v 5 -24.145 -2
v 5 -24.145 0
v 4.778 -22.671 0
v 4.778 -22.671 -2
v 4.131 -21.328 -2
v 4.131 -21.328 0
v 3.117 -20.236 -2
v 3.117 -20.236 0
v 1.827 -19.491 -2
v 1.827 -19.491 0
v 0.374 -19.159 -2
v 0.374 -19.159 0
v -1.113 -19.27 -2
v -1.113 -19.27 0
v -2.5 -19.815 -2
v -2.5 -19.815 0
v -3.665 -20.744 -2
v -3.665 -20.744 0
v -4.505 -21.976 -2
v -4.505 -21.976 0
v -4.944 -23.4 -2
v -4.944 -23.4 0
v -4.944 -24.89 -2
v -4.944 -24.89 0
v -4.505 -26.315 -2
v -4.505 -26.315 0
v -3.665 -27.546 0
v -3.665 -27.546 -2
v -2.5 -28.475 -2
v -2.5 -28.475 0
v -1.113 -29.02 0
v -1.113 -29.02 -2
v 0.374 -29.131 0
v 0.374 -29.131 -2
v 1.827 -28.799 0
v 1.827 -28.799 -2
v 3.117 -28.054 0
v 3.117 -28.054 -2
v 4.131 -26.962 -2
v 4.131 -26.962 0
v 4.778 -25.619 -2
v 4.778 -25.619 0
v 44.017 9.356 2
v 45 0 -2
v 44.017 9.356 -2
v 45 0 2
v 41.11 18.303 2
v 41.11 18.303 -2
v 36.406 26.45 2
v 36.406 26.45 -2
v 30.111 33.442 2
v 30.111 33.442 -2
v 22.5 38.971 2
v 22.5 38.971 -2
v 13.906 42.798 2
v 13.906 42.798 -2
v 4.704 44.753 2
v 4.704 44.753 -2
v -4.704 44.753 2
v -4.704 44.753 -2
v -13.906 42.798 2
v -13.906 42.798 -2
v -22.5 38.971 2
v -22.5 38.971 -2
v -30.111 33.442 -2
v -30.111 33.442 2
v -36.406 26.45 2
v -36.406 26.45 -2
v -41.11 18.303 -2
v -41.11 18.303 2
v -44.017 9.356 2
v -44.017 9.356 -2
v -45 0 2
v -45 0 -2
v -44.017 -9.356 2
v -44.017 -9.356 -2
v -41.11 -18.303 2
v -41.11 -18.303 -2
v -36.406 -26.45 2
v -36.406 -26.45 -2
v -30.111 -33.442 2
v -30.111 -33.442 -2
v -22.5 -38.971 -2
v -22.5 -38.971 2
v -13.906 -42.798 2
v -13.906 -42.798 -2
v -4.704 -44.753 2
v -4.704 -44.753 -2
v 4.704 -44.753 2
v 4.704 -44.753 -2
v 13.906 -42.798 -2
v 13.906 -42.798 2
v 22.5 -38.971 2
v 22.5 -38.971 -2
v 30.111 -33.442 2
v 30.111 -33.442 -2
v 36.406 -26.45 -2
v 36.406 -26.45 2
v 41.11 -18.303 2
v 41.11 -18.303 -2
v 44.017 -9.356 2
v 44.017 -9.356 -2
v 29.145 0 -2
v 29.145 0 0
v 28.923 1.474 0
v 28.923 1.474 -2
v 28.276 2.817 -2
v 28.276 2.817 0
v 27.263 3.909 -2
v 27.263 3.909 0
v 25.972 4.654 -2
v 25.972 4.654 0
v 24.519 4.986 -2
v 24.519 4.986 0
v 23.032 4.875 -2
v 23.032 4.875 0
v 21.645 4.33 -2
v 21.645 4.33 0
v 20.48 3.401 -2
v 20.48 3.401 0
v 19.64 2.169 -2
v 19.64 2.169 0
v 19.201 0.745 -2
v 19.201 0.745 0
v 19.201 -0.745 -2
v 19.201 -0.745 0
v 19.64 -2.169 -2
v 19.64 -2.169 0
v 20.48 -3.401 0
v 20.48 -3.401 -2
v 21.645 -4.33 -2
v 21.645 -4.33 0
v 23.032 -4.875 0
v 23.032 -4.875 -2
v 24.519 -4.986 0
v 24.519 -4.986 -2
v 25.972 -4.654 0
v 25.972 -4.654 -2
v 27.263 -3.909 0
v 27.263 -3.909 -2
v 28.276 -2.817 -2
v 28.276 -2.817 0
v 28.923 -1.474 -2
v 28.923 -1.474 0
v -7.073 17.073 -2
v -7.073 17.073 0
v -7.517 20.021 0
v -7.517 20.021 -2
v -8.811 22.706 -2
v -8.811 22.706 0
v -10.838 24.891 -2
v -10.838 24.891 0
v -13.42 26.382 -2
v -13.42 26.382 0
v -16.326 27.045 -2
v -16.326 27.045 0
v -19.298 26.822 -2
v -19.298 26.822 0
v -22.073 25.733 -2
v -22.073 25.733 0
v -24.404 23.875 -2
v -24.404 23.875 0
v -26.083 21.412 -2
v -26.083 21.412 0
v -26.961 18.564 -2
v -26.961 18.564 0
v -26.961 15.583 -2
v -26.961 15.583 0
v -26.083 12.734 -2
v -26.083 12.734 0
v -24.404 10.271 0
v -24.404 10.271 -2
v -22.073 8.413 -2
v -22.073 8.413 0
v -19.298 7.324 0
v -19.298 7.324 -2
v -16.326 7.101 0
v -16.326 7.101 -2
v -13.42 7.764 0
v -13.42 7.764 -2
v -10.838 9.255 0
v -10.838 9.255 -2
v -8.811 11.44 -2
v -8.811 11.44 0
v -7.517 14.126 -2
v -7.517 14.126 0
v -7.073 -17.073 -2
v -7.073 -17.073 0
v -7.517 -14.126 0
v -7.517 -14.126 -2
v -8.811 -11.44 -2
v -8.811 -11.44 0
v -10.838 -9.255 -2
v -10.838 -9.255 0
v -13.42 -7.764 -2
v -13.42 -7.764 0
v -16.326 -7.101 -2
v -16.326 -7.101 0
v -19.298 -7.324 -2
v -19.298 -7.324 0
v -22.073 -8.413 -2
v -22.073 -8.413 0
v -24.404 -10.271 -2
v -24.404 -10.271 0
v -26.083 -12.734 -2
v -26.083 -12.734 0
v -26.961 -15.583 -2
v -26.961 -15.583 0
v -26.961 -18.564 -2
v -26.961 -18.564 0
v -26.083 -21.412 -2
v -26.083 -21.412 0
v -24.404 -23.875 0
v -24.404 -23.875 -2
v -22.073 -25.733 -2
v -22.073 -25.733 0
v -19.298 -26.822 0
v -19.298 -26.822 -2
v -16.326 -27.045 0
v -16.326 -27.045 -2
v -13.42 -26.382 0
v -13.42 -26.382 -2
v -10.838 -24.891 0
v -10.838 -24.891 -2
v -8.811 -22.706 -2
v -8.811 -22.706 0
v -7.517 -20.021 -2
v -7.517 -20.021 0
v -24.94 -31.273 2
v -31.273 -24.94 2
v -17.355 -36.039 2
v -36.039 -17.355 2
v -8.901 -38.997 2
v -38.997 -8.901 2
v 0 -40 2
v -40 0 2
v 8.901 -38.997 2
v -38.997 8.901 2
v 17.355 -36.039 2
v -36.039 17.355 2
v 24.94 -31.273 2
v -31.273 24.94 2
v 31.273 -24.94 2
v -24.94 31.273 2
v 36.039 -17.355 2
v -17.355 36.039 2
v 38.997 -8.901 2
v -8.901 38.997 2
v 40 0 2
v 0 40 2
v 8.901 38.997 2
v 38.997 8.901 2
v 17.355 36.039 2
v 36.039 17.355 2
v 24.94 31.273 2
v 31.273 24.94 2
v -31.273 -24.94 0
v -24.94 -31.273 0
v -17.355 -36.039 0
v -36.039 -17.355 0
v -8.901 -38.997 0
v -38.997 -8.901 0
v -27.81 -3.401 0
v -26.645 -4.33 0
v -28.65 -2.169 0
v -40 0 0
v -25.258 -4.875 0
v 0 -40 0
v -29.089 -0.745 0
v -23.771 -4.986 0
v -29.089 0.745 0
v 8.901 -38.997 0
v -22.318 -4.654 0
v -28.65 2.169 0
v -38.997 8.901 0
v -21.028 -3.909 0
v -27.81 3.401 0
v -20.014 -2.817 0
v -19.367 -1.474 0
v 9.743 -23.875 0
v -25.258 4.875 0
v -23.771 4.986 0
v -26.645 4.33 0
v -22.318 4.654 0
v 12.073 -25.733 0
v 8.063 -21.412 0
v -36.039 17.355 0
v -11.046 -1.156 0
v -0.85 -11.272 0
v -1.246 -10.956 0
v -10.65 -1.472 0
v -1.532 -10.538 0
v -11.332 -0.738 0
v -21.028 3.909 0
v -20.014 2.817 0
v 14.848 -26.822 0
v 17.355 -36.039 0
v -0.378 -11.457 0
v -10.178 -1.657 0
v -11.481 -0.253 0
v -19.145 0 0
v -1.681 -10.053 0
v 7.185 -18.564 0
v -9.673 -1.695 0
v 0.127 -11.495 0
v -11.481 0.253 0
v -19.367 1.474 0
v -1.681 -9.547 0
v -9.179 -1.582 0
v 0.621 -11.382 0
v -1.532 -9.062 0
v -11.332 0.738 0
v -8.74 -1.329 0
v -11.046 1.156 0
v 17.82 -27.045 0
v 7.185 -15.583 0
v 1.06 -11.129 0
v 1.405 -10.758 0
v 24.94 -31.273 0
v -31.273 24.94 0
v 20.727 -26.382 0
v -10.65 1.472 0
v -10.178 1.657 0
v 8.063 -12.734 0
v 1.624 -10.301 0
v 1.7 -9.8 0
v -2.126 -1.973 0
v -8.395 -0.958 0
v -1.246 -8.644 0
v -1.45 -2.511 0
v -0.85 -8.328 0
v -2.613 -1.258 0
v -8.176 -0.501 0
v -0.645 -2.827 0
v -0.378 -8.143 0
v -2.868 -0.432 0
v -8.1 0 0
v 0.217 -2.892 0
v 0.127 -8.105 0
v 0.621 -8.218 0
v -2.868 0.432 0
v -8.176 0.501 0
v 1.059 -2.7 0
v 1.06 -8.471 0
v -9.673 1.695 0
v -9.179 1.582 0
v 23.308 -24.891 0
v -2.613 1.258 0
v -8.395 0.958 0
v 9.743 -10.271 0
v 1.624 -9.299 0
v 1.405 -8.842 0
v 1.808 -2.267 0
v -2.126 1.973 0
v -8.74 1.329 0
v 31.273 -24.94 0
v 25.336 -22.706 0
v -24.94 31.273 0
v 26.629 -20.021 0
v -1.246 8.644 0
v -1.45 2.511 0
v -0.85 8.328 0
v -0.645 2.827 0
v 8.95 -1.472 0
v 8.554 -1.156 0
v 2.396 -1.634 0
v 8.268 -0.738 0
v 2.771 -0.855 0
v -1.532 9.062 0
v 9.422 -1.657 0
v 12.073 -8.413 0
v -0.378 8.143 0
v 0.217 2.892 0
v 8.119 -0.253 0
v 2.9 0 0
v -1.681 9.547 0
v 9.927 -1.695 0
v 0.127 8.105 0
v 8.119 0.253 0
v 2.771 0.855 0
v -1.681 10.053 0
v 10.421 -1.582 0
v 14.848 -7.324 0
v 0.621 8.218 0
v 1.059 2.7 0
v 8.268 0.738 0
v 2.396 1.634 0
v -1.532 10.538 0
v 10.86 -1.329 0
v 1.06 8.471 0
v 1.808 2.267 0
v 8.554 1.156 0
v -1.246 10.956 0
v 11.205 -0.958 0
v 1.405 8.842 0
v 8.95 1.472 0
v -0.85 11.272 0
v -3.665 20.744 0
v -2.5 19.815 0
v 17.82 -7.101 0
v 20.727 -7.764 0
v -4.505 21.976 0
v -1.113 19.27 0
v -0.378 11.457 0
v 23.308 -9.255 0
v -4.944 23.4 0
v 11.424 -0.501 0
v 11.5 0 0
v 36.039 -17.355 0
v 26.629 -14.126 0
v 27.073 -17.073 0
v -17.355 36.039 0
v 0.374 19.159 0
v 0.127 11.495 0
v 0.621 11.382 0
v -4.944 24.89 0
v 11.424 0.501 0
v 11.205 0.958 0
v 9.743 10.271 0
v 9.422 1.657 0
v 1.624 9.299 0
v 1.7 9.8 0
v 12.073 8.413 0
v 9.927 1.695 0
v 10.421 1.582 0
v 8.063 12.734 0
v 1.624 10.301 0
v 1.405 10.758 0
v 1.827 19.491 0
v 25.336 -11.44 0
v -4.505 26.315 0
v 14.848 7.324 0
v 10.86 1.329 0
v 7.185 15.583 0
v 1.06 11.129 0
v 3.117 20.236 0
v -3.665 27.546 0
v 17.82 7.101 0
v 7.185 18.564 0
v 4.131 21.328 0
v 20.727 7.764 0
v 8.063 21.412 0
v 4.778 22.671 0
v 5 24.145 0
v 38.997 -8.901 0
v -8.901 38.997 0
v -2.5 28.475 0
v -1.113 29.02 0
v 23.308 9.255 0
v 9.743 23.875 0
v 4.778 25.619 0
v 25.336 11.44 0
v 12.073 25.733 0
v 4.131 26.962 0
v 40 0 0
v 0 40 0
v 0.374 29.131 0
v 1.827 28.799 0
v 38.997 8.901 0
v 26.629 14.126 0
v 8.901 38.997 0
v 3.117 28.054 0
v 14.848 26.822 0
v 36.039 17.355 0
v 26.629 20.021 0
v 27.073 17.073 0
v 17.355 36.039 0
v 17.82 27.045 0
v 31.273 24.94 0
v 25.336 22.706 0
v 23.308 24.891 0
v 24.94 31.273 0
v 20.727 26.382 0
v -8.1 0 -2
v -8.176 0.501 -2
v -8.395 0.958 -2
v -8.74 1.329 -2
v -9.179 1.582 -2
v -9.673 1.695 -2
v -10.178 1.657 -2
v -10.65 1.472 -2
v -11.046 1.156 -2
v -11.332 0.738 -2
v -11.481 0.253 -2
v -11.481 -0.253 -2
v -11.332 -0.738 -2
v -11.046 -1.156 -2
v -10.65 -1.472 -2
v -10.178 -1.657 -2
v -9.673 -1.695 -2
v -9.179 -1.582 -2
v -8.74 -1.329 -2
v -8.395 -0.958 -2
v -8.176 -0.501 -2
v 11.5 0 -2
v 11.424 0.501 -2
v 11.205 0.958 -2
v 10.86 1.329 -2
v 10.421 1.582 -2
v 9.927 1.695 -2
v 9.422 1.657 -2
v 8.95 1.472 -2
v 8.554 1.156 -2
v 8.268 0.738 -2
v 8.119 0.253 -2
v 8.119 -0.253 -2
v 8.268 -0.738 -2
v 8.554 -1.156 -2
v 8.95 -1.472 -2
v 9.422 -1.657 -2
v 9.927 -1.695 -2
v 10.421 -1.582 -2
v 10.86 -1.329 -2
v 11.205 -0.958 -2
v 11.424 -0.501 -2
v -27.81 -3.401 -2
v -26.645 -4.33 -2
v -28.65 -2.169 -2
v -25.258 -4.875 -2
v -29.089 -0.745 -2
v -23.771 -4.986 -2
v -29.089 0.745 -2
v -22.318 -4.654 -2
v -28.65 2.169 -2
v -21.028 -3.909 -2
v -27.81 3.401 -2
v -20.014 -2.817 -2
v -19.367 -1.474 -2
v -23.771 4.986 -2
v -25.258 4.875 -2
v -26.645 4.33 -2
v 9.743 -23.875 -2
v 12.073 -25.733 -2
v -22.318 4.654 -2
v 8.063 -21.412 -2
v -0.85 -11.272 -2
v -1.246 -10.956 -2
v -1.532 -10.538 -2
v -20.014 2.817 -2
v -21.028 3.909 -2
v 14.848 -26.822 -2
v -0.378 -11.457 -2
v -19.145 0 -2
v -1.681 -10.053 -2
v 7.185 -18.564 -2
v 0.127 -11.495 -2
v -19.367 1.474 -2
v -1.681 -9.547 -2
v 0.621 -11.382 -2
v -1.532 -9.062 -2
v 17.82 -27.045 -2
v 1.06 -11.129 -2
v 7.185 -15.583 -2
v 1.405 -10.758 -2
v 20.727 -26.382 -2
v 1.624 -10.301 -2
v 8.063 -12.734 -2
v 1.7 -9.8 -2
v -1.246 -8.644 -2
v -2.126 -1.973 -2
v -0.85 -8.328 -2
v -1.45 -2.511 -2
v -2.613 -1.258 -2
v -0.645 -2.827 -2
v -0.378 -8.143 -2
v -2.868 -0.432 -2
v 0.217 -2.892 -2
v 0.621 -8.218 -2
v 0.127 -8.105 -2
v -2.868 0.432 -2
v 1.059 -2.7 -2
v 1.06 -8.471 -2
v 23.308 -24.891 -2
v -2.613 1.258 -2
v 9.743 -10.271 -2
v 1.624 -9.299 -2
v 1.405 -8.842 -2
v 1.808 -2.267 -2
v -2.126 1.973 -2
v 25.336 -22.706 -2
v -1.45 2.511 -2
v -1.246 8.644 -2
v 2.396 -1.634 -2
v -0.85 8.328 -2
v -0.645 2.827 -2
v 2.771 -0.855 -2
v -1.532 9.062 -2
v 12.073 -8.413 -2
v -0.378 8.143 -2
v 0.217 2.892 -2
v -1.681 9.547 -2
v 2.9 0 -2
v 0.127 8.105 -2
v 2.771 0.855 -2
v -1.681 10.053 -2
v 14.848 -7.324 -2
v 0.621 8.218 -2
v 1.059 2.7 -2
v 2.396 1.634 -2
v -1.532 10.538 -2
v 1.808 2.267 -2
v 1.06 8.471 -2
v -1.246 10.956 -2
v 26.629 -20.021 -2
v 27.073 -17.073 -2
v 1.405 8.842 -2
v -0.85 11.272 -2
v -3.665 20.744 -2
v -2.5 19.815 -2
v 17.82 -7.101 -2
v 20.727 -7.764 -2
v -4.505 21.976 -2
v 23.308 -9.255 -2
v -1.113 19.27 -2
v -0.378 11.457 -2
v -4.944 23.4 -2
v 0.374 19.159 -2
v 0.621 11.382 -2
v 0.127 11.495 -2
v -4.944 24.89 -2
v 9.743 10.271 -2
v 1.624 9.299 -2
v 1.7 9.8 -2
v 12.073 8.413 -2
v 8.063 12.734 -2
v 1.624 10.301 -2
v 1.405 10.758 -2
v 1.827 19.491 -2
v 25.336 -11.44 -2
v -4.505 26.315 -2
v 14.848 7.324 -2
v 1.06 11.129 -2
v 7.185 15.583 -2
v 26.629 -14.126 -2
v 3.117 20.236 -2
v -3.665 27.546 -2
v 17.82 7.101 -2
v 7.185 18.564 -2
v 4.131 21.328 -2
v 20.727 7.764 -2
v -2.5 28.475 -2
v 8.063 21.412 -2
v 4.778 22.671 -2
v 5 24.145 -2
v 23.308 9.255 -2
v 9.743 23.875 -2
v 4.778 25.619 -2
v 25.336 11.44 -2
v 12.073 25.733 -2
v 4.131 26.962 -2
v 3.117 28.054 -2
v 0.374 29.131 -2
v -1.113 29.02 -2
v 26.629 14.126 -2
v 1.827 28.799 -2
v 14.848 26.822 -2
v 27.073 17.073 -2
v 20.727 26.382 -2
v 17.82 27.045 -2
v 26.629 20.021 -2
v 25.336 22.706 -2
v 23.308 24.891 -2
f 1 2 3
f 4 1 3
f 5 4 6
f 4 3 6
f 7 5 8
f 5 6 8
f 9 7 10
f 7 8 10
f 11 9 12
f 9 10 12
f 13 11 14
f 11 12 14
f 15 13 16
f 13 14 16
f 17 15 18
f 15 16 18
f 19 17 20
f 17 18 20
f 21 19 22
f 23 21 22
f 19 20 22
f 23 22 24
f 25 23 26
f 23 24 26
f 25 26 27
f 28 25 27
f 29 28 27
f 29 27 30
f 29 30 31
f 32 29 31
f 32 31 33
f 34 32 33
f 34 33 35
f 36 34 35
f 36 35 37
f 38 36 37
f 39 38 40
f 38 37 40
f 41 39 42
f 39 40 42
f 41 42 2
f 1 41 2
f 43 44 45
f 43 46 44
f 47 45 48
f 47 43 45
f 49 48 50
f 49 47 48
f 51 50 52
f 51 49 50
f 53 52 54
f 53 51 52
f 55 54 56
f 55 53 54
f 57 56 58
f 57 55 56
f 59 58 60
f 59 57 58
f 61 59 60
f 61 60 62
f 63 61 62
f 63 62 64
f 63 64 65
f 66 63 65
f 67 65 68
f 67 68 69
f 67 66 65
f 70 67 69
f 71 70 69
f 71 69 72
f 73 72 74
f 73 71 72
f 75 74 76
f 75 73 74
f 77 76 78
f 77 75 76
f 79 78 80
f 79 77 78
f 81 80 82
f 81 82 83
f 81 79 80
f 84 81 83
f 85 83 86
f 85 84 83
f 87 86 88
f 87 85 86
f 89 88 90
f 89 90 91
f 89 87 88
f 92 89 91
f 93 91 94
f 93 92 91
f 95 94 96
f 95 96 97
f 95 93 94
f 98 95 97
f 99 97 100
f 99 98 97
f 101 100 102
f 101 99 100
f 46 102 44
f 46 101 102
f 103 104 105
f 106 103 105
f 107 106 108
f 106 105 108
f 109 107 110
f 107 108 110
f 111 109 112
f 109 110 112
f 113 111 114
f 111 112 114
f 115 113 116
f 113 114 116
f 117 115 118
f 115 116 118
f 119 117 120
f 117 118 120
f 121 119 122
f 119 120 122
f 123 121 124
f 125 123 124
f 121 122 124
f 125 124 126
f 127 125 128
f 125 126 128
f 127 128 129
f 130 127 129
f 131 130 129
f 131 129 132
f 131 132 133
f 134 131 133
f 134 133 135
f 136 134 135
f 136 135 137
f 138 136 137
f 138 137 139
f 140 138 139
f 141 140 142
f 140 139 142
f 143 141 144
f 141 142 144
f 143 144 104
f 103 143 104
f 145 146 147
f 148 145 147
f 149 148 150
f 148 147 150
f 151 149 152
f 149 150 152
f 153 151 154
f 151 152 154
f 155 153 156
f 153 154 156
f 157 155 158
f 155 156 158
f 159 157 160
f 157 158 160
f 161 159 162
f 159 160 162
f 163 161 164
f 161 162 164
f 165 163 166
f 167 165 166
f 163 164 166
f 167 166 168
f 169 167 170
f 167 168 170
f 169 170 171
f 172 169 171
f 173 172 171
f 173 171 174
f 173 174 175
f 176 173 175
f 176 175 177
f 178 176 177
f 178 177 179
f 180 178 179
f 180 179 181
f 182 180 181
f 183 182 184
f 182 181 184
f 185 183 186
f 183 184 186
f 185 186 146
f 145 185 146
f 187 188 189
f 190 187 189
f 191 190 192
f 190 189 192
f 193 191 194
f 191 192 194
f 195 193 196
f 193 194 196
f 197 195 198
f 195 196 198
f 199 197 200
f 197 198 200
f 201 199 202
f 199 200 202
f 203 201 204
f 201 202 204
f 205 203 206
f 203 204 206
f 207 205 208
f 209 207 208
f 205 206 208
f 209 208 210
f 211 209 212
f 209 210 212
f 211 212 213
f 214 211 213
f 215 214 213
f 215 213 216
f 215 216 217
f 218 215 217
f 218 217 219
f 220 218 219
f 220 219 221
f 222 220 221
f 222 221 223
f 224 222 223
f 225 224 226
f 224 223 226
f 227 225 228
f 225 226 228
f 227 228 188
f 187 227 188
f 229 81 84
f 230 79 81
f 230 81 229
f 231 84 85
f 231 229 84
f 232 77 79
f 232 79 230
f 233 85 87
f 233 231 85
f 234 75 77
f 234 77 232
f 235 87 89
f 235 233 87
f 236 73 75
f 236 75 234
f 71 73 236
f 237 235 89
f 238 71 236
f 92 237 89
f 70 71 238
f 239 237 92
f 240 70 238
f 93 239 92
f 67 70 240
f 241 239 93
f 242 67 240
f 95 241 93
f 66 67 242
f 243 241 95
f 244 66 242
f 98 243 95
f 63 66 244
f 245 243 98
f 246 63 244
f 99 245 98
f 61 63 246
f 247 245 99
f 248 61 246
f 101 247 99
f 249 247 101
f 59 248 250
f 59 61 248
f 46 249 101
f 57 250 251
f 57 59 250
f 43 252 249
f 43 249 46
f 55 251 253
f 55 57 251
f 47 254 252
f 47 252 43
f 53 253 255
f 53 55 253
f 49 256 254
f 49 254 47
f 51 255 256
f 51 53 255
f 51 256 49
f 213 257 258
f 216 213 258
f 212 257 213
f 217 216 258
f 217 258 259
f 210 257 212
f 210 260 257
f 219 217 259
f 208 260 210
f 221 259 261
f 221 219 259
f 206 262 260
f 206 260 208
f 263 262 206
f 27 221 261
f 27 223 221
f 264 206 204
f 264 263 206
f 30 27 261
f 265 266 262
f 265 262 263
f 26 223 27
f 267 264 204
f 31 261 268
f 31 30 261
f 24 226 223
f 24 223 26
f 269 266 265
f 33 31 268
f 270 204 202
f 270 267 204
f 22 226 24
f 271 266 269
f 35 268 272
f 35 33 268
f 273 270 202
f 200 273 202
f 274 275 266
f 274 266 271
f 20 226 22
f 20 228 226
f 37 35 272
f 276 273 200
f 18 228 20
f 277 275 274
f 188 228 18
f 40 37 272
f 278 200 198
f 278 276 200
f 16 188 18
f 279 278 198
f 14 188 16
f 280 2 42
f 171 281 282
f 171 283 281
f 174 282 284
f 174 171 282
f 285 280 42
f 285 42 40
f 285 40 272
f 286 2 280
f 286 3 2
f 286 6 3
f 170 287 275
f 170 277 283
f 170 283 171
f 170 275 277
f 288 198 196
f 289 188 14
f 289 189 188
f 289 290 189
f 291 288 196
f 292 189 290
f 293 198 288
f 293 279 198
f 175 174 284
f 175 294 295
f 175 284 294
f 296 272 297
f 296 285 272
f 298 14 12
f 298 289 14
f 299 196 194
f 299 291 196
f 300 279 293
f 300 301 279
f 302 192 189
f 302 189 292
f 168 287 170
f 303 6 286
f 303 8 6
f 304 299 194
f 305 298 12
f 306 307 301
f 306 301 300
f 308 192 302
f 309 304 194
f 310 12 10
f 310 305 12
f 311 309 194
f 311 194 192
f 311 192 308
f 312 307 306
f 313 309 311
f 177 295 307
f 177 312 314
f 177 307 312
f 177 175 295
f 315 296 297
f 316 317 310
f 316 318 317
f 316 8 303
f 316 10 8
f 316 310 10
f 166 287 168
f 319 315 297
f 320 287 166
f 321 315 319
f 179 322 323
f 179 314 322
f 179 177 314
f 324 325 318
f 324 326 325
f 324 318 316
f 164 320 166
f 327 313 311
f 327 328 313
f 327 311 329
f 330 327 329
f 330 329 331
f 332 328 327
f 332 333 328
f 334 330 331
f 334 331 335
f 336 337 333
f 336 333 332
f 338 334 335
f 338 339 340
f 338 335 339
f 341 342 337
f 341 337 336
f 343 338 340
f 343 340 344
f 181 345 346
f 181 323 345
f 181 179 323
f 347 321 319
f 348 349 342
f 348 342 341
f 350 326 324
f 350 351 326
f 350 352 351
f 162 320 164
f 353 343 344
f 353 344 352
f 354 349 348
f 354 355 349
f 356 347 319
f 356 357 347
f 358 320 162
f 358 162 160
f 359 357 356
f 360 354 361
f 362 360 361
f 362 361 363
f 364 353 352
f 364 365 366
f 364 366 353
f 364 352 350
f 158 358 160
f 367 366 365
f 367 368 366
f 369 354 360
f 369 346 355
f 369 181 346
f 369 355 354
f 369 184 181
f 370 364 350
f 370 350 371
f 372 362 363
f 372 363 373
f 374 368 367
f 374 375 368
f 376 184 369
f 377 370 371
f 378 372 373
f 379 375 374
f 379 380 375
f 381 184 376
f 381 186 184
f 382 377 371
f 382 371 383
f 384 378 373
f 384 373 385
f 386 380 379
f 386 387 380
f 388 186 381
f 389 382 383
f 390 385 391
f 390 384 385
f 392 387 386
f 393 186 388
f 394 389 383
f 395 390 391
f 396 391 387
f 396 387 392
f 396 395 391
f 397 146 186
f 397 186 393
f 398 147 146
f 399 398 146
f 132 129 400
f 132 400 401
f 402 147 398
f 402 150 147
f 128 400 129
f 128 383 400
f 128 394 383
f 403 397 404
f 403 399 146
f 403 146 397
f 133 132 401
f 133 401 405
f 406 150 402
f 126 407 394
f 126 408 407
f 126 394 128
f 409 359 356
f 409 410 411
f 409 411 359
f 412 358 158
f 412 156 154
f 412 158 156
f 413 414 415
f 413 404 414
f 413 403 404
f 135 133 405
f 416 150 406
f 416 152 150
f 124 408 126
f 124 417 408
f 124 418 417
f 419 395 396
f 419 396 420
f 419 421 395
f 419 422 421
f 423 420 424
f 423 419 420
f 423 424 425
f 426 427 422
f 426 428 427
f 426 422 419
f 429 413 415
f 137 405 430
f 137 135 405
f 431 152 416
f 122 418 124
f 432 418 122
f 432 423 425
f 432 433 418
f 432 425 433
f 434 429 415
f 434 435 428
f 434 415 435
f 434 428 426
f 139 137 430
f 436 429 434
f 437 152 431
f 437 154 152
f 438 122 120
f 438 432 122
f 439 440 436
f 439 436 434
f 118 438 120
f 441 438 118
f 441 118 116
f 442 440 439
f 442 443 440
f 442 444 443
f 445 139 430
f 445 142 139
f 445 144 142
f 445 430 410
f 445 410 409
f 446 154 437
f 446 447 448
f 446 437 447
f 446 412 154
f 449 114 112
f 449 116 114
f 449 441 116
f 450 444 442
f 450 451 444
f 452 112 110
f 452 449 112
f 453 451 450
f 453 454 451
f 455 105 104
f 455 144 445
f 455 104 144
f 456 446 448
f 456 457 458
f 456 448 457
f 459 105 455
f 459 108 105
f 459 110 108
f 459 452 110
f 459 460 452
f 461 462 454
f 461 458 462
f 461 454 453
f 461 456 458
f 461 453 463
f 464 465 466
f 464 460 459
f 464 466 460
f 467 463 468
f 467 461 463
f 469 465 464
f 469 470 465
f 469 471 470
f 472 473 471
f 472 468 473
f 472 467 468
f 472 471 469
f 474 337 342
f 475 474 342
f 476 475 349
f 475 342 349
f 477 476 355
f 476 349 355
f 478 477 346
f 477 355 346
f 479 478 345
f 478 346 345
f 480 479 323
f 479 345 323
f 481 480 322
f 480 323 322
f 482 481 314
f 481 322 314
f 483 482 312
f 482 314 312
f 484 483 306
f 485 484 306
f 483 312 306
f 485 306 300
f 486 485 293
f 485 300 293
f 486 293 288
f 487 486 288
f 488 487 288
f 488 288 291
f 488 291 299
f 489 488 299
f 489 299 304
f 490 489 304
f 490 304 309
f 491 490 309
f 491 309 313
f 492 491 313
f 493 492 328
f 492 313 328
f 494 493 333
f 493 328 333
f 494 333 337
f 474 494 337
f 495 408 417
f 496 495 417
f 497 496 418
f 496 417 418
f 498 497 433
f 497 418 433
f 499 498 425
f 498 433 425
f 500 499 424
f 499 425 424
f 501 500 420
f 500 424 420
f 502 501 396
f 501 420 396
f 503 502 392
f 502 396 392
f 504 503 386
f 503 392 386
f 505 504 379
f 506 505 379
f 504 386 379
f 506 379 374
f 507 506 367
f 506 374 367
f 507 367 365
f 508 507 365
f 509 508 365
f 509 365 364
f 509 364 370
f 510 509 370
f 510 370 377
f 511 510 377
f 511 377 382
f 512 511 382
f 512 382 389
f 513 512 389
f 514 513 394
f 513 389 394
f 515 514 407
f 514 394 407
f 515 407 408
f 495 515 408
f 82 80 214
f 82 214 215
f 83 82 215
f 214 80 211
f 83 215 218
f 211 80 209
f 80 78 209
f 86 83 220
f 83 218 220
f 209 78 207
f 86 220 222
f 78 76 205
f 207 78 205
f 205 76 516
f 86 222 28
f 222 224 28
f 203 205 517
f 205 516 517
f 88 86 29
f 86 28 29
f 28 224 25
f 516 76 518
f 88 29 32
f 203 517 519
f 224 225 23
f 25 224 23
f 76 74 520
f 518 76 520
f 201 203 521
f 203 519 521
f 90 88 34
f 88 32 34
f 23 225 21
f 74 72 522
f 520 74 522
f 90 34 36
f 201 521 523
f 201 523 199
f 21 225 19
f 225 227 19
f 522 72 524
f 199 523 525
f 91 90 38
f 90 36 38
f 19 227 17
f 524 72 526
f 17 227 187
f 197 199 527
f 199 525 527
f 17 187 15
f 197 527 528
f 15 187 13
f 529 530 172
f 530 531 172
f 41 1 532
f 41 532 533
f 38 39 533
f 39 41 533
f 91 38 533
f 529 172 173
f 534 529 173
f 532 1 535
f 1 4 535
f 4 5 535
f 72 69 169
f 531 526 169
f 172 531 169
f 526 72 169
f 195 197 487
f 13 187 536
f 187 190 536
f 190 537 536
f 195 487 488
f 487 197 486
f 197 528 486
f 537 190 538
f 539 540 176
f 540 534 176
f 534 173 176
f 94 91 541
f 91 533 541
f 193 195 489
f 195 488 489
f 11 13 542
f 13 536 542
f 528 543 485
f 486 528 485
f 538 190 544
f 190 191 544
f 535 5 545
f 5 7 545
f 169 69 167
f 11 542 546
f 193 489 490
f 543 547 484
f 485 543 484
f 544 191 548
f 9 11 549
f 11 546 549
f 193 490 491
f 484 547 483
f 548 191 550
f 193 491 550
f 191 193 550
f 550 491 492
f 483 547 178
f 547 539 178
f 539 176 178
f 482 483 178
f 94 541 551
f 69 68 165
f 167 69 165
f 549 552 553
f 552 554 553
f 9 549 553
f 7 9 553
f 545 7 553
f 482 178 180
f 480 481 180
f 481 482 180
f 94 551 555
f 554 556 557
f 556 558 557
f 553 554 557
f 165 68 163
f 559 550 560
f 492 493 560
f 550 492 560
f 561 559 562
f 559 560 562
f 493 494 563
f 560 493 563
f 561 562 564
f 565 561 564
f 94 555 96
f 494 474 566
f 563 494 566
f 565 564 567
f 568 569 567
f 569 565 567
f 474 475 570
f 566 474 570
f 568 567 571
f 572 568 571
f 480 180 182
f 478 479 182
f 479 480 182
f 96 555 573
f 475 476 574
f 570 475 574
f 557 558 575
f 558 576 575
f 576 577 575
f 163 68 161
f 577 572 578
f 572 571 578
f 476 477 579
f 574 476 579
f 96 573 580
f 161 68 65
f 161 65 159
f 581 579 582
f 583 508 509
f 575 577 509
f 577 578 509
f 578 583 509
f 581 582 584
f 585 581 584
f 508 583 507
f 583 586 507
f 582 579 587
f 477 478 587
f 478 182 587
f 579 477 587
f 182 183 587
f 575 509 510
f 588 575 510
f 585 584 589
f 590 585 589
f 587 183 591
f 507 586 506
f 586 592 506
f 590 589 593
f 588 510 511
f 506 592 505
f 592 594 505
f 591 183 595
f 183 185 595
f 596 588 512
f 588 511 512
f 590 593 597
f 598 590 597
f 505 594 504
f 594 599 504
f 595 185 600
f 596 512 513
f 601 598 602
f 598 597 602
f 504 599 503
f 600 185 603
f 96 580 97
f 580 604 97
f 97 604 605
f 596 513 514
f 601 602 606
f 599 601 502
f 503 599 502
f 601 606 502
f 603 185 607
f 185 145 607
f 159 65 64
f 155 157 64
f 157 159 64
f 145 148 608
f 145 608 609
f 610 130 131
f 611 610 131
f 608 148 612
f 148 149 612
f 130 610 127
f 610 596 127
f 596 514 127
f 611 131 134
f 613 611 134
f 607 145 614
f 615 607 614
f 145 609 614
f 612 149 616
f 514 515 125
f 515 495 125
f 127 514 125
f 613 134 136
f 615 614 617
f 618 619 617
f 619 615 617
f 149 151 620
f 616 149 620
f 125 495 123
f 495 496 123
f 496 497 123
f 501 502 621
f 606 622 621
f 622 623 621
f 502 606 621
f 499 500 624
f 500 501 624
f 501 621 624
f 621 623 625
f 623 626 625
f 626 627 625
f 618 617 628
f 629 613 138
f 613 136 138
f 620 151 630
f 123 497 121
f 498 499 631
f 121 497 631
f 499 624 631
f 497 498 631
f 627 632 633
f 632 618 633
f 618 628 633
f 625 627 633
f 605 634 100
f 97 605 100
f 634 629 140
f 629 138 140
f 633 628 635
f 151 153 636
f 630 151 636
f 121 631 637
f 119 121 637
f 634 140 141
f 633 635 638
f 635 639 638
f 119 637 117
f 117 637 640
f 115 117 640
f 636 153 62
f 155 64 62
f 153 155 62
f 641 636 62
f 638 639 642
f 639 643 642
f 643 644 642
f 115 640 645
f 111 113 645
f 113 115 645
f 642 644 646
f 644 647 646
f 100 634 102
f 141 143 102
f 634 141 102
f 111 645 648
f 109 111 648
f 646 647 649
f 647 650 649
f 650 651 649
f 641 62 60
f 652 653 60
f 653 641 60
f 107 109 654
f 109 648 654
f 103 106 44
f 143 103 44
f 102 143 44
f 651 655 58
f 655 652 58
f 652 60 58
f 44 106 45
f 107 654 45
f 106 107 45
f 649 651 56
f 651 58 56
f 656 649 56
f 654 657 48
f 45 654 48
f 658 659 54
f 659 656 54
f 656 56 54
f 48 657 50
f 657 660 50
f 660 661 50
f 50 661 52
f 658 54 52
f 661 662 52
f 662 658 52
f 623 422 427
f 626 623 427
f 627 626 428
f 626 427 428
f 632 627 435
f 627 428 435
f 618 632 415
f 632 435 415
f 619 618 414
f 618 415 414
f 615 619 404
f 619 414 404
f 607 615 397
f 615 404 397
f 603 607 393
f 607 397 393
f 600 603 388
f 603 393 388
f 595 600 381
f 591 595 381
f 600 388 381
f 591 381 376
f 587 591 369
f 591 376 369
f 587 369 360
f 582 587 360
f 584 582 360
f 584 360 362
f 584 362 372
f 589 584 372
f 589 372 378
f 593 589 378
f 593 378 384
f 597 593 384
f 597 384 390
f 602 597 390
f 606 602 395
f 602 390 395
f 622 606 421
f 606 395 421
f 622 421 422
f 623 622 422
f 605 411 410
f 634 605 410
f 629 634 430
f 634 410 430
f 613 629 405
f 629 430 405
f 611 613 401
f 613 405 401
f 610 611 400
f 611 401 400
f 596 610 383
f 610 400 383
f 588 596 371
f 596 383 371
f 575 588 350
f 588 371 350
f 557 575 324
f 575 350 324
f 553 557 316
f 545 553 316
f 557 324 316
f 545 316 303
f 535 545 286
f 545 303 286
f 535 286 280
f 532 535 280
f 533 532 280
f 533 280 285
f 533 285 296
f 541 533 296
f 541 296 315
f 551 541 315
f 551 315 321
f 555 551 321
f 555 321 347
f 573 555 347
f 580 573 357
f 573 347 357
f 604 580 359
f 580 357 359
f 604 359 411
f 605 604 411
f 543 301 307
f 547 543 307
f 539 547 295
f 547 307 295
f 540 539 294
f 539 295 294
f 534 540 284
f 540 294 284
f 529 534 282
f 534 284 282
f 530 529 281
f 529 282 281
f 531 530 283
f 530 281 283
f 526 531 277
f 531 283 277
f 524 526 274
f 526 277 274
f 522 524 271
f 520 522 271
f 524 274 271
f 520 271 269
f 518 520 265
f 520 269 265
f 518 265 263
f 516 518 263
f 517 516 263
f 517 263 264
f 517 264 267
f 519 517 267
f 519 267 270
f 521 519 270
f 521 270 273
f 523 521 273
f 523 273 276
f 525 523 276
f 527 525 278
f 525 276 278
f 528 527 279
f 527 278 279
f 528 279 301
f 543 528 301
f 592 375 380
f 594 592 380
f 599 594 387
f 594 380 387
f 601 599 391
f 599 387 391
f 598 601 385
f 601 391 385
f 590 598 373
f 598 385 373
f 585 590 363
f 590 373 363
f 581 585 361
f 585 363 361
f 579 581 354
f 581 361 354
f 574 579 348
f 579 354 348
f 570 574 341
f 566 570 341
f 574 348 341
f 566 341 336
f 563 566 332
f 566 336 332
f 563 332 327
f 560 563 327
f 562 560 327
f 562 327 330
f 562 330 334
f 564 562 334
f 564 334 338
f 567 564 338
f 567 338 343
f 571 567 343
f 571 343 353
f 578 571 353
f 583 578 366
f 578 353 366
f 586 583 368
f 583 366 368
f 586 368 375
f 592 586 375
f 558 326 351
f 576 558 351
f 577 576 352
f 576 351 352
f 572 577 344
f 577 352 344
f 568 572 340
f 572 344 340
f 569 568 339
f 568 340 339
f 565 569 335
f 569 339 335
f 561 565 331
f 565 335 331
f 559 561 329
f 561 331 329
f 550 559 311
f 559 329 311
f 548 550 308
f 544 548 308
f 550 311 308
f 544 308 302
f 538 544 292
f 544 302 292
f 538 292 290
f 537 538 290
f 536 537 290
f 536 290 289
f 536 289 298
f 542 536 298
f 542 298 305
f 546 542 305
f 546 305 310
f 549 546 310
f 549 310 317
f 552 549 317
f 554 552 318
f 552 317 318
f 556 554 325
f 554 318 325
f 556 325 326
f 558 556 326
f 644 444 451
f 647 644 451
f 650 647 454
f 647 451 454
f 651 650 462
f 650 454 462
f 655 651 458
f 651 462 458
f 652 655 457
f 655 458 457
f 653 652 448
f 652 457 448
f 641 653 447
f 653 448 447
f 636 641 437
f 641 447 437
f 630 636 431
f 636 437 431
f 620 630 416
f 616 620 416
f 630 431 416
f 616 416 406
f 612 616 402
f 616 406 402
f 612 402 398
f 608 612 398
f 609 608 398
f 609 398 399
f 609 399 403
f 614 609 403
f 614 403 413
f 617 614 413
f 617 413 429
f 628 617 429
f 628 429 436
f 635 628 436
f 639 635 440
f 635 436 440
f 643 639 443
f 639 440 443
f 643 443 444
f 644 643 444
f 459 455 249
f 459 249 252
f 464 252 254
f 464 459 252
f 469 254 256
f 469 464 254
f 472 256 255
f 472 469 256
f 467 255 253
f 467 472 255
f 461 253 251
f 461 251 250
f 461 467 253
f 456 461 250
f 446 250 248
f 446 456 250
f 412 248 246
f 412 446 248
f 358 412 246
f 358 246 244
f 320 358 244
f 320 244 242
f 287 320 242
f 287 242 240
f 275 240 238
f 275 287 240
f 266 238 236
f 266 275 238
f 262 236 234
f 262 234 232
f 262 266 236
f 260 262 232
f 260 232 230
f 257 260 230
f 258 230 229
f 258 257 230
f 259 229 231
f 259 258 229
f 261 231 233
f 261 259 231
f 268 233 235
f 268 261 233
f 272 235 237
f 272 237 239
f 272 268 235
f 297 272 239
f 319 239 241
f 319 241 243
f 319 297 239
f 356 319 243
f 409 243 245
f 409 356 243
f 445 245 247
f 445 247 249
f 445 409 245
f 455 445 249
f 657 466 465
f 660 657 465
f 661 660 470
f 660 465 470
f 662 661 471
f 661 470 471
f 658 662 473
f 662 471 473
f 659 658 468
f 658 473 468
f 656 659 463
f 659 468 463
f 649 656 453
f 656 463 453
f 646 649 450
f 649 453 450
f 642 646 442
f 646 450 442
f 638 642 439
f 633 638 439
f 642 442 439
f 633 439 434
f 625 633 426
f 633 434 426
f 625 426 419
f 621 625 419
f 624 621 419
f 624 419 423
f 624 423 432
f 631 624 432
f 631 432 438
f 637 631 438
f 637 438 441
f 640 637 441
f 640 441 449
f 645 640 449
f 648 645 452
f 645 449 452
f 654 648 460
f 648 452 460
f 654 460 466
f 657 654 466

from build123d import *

# Parameters (mm, degrees)
F0_R     = 45
F0_R_2   = 40
F1_DEPTH = 2
F0_R_3   = 10
F0_R_4   = 5
F0_R_5   = 1.7
F0_R_6   = 4.4
F0_R_7   = 2.9
F2_DEPTH = 2


with BuildPart() as f1:
    # F0 (on Top) → F1 (new body, symmetric)
    with BuildSketch(Plane.XY):
        Circle(F0_R)
        Circle(F0_R_2, mode=Mode.SUBTRACT)
    extrude(amount=F1_DEPTH, both=True)

    # F0 (on Top) → F2 (join, through all)
    with BuildSketch(Plane.XY):
        Circle(F0_R_2)
        with Locations((-17.07316, -17.07316)):
            Circle(F0_R_3, mode=Mode.SUBTRACT)
        with Locations((0, -24.145094)):
            Circle(F0_R_4, mode=Mode.SUBTRACT)
        with Locations((17.07316, -17.07316)):
            Circle(F0_R_3, mode=Mode.SUBTRACT)
        with Locations((0, -9.8)):
            Circle(F0_R_5, mode=Mode.SUBTRACT)
        with Locations((-24.145094, 0)):
            Circle(F0_R_4, mode=Mode.SUBTRACT)
        with Locations((-9.8, 0)):
            Circle(F0_R_5, mode=Mode.SUBTRACT)
        with Locations((-17.07316, 17.07316)):
            Circle(F0_R_3, mode=Mode.SUBTRACT)
        Circle(F0_R_6, mode=Mode.SUBTRACT)
        with Locations((9.8, 0)):
            Circle(F0_R_5, mode=Mode.SUBTRACT)
        with Locations((0, 9.8)):
            Circle(F0_R_5, mode=Mode.SUBTRACT)
        with Locations((17.07316, 17.07316)):
            Circle(F0_R_3, mode=Mode.SUBTRACT)
        with Locations((24.145094, 0)):
            Circle(F0_R_4, mode=Mode.SUBTRACT)
        with Locations((0, 24.145094)):
            Circle(F0_R_4, mode=Mode.SUBTRACT)
        Circle(F0_R_6)
        Circle(F0_R_7, mode=Mode.SUBTRACT)
    extrude(amount=-F2_DEPTH)


solid = f1.part
